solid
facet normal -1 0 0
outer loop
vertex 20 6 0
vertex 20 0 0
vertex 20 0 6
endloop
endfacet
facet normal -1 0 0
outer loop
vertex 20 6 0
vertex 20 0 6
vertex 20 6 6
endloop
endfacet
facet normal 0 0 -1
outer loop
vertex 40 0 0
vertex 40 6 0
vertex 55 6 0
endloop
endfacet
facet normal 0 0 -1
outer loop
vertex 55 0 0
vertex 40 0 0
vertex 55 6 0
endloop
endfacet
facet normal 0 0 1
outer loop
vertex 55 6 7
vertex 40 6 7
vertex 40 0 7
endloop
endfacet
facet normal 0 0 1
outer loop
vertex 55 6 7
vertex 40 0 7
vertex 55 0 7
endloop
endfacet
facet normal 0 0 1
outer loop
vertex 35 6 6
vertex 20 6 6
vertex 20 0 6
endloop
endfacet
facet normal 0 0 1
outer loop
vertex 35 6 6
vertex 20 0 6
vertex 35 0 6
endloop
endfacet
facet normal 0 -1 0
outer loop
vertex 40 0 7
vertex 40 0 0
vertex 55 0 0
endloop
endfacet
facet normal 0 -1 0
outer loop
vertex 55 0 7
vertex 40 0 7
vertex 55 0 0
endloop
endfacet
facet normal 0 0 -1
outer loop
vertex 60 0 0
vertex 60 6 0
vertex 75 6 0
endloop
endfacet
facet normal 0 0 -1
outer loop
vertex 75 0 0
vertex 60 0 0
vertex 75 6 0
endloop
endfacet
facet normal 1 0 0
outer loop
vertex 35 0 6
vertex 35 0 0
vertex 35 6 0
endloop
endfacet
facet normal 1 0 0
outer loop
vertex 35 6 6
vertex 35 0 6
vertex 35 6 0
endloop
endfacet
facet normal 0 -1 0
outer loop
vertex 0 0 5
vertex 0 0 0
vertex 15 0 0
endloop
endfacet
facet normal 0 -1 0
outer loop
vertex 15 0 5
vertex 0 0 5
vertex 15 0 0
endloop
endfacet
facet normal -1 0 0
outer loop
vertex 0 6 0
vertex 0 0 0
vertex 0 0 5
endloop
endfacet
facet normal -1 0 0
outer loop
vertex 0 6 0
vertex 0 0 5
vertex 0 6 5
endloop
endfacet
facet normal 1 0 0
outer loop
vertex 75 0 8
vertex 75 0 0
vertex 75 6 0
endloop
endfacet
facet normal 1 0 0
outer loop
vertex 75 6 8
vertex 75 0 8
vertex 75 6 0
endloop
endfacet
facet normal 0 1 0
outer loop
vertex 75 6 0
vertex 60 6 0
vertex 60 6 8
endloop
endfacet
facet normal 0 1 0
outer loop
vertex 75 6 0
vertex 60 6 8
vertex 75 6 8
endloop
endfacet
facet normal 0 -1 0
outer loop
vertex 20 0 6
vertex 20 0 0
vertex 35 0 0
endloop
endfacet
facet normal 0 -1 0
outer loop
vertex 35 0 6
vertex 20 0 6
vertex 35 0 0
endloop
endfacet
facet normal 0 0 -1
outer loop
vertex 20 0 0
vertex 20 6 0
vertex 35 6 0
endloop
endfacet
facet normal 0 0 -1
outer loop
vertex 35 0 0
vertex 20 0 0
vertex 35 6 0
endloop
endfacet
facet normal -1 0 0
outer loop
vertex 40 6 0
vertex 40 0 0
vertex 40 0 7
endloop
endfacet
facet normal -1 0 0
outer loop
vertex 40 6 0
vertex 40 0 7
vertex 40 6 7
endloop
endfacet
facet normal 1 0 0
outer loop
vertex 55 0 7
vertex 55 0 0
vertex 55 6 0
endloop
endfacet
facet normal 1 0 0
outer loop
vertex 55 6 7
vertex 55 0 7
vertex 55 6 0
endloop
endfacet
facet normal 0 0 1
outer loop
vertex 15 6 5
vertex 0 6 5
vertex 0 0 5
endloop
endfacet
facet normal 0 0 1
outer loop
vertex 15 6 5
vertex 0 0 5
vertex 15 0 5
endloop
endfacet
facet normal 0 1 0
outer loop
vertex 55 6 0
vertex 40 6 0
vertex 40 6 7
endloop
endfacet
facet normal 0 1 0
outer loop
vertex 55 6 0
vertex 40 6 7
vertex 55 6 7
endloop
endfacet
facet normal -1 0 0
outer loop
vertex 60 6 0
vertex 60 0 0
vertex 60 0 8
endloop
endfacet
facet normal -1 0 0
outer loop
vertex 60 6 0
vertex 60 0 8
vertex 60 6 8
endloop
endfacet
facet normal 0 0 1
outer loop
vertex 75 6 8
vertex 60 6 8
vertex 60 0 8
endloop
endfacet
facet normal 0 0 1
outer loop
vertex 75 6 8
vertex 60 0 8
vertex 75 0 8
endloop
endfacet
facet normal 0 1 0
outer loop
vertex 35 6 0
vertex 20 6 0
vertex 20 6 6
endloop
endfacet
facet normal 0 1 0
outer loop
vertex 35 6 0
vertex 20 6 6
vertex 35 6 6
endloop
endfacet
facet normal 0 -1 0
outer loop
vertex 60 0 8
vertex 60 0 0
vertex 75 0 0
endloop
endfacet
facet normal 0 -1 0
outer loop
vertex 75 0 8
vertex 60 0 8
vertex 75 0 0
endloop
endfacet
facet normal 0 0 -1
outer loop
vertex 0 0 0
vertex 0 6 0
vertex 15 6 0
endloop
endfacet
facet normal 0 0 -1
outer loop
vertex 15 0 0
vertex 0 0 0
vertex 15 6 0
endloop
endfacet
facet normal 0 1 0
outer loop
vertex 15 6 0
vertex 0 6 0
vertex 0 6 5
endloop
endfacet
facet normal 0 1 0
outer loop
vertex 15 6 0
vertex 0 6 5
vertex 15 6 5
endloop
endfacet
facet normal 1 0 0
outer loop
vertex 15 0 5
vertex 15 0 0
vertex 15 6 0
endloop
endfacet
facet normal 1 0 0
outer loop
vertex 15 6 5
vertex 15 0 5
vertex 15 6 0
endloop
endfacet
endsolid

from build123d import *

# Parameters (mm, degrees)
F0_W     = 15
F0_H     = 6
F1_DEPTH = 5
F2_DEPTH = 6
F3_DEPTH = 7
F4_DEPTH = 8


with BuildPart() as f1:
    # F0 (on Top) → F1 (new body)
    with BuildSketch(Plane.XY):
        with Locations((7.5, 3)):
            Rectangle(F0_W, F0_H)
    extrude(amount=F1_DEPTH)


with BuildPart() as f2:
    # F0 (on Top) → F2 (new body)
    with BuildSketch(Plane.XY):
        with Locations((27.5, 3)):
            Rectangle(F0_W, F0_H)
    extrude(amount=F2_DEPTH)


with BuildPart() as f3:
    # F0 (on Top) → F3 (new body)
    with BuildSketch(Plane.XY):
        with Locations((47.5, 3)):
            Rectangle(F0_W, F0_H)
    extrude(amount=F3_DEPTH)


with BuildPart() as f4:
    # F0 (on Top) → F4 (new body)
    with BuildSketch(Plane.XY):
        with Locations((67.5, 3)):
            Rectangle(F0_W, F0_H)
    extrude(amount=F4_DEPTH)


solid = Compound([f1.part, f2.part, f3.part, f4.part])
